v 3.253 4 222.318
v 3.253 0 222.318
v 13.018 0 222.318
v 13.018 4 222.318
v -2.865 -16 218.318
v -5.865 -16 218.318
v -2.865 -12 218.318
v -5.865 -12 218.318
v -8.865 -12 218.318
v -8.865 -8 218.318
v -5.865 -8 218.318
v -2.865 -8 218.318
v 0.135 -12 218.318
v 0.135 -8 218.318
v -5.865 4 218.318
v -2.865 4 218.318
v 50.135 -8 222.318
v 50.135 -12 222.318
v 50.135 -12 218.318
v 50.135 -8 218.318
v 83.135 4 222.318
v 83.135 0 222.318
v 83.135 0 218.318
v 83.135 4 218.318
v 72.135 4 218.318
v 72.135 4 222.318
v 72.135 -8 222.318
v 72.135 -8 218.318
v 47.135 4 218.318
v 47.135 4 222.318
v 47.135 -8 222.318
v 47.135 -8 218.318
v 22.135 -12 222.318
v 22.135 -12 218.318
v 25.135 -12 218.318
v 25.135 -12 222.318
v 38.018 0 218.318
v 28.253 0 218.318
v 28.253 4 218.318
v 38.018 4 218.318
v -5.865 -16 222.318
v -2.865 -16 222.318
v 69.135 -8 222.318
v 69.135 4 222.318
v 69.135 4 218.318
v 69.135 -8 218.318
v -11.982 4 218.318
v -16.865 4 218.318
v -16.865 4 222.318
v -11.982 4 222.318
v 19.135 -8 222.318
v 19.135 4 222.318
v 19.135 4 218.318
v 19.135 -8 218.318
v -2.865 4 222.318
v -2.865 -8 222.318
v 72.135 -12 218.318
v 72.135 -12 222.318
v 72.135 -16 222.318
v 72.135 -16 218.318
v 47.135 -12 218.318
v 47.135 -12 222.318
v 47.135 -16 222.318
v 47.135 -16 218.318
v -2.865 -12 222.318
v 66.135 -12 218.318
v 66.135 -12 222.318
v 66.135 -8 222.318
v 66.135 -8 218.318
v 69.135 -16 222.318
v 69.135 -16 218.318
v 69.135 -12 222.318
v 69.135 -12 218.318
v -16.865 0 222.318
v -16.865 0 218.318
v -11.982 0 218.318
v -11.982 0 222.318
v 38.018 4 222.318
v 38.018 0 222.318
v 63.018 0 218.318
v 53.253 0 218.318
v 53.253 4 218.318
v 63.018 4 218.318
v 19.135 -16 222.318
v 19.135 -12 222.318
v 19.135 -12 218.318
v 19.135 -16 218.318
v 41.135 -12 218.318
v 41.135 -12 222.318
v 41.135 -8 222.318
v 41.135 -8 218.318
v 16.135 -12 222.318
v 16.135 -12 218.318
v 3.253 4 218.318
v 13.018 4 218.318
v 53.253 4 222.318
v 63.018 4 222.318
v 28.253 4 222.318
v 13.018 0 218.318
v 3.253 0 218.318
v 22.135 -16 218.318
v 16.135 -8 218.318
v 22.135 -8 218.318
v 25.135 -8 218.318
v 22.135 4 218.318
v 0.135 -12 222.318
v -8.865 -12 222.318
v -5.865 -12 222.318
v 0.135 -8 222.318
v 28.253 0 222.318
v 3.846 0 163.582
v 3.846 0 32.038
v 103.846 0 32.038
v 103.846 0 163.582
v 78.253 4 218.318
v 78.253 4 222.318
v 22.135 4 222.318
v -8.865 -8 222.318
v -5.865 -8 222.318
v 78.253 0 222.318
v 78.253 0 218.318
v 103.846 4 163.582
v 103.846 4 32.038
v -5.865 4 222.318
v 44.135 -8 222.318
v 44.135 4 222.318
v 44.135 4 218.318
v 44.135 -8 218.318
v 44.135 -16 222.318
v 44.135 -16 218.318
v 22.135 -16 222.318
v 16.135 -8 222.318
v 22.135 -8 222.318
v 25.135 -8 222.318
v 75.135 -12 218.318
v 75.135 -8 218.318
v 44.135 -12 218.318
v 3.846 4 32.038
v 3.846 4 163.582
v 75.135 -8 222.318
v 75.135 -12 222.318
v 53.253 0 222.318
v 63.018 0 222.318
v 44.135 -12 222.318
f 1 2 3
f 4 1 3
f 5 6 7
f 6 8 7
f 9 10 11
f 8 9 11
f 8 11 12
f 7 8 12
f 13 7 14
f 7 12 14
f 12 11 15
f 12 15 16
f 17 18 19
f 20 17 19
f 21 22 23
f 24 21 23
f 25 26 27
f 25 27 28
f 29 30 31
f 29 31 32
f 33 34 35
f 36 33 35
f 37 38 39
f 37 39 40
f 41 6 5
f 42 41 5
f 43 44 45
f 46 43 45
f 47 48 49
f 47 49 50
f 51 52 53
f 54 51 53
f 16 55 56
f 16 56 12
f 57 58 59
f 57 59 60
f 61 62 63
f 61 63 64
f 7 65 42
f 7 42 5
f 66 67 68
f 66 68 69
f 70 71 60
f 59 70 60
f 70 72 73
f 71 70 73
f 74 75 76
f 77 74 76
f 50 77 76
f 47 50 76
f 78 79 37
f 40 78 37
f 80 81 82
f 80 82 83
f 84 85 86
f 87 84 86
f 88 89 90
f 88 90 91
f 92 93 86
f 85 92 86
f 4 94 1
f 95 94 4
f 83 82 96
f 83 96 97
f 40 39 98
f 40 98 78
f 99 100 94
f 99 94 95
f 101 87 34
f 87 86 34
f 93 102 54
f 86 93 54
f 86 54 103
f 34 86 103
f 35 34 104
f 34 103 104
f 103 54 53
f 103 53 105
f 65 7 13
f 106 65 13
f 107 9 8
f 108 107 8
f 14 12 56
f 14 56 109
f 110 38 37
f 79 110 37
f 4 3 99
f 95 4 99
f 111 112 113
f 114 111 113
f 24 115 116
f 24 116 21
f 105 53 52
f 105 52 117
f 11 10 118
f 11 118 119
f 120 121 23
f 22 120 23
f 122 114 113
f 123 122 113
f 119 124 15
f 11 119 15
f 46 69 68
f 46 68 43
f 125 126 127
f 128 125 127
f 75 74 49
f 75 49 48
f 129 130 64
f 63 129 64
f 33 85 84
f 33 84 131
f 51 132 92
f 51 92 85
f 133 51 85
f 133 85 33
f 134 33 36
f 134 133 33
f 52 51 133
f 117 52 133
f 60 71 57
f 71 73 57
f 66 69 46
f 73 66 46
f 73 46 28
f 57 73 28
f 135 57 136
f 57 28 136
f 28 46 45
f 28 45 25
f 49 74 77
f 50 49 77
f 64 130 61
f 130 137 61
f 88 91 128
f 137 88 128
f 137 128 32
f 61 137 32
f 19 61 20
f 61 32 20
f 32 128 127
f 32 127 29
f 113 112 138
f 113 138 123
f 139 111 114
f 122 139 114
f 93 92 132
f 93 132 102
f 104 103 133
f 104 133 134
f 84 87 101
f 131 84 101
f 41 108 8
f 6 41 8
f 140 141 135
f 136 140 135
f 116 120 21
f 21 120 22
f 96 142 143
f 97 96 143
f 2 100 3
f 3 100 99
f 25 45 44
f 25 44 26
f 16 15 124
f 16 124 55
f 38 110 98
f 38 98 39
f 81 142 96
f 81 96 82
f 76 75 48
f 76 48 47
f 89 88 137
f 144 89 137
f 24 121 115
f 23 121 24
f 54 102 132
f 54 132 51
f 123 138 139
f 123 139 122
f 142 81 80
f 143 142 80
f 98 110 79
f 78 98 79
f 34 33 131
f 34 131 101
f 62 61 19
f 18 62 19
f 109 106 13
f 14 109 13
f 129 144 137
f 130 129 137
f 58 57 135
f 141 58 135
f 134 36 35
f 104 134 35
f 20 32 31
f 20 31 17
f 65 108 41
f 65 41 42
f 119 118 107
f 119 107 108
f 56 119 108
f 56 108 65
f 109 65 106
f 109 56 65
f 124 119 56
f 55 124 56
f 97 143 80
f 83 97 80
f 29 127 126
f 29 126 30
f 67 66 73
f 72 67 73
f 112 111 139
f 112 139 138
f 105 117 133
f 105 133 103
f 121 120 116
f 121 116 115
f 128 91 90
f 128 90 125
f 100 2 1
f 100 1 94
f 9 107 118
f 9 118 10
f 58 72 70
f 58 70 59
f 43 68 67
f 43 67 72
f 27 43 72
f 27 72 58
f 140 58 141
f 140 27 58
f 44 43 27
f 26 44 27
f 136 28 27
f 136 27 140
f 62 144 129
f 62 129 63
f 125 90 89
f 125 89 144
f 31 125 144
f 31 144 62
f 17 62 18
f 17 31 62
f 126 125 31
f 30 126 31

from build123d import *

# Parameters (mm, degrees)
SKETCH3_W             = 4.882352942
SKETCH3_H             = 4
BOSS_EXTRUDE2_DEPTH   = 4
SKETCH3_W_2           = 3
BOSS_EXTRUDE2_2_DEPTH = 4
SKETCH3_W_3           = 9.764705883
BOSS_EXTRUDE2_3_DEPTH = 4
BOSS_EXTRUDE2_4_DEPTH = 4
BOSS_EXTRUDE2_5_DEPTH = 4
BOSS_EXTRUDE2_6_DEPTH = 4
BOSS_EXTRUDE2_7_DEPTH = 4
BOSS_EXTRUDE2_8_DEPTH = 4
SKETCH3_W_4           = 4.882352941
BOSS_EXTRUDE2_9_DEPTH = 4
SKETCH3_6_W           = 3
SKETCH3_6_H           = 4
BOSS_EXTRUDE4_DEPTH   = 16
BOSS_EXTRUDE5_START   = -12
SKETCH3_7_W           = 3
SKETCH3_7_H           = 4
BOSS_EXTRUDE5_DEPTH   = 4
SKETCH4_W             = 100
SKETCH4_H             = 131.543597655
BOSS_EXTRUDE6_DEPTH   = 4


with BuildPart() as part:
    # Sketch3 → Boss-Extrude2 (new body)
    with BuildSketch(Plane(origin=(0, 0, 0), x_dir=(1, 0, 0), z_dir=(0, 1, 0))):
        with Locations((-14.423551679, -220.31766228)):
            Rectangle(SKETCH3_W, SKETCH3_H)
    extrude(amount=BOSS_EXTRUDE2_DEPTH)


with BuildPart() as body_2:
    # Sketch3 → Boss-Extrude2 2 (new body)
    with BuildSketch(Plane(origin=(0, 0, 0), x_dir=(1, 0, 0), z_dir=(0, 1, 0))):
        with Locations((-4.36472815, -220.31766228)):
            Rectangle(SKETCH3_W_2, SKETCH3_H)
    extrude(amount=BOSS_EXTRUDE2_2_DEPTH)



with BuildPart() as body_3:
    # Sketch3 → Boss-Extrude2 3 (new body)
    with BuildSketch(Plane(origin=(0, 0, 0), x_dir=(1, 0, 0), z_dir=(0, 1, 0))):
        with Locations((8.135271851, -220.31766228)):
            Rectangle(SKETCH3_W_3, SKETCH3_H)
    extrude(amount=BOSS_EXTRUDE2_3_DEPTH)


with BuildPart() as body_4:
    # Sketch3 → Boss-Extrude2 4 (new body)
    with BuildSketch(Plane(origin=(0, 0, 0), x_dir=(1, 0, 0), z_dir=(0, 1, 0))):
        with Locations((20.63527185, -220.31766228)):
            Rectangle(SKETCH3_W_2, SKETCH3_H)
    extrude(amount=BOSS_EXTRUDE2_4_DEPTH)


with BuildPart() as body_5:
    # Sketch3 → Boss-Extrude2 5 (new body)
    with BuildSketch(Plane(origin=(0, 0, 0), x_dir=(1, 0, 0), z_dir=(0, 1, 0))):
        with Locations((33.135271851, -220.31766228)):
            Rectangle(SKETCH3_W_3, SKETCH3_H)
    extrude(amount=BOSS_EXTRUDE2_5_DEPTH)


with BuildPart() as body_6:
    # Sketch3 → Boss-Extrude2 6 (new body)
    with BuildSketch(Plane(origin=(0, 0, 0), x_dir=(1, 0, 0), z_dir=(0, 1, 0))):
        with Locations((45.63527185, -220.31766228)):
            Rectangle(SKETCH3_W_2, SKETCH3_H)
    extrude(amount=BOSS_EXTRUDE2_6_DEPTH)


with BuildPart() as body_7:
    # Sketch3 → Boss-Extrude2 7 (new body)
    with BuildSketch(Plane(origin=(0, 0, 0), x_dir=(1, 0, 0), z_dir=(0, 1, 0))):
        with Locations((58.135271851, -220.31766228)):
            Rectangle(SKETCH3_W_3, SKETCH3_H)
    extrude(amount=BOSS_EXTRUDE2_7_DEPTH)


with BuildPart() as body_8:
    # Sketch3 → Boss-Extrude2 8 (new body)
    with BuildSketch(Plane(origin=(0, 0, 0), x_dir=(1, 0, 0), z_dir=(0, 1, 0))):
        with Locations((70.63527185, -220.31766228)):
            Rectangle(SKETCH3_W_2, SKETCH3_H)
    extrude(amount=BOSS_EXTRUDE2_8_DEPTH)


with BuildPart() as body_9:
    # Sketch3 → Boss-Extrude2 9 (new body)
    with BuildSketch(Plane(origin=(0, 0, 0), x_dir=(1, 0, 0), z_dir=(0, 1, 0))):
        with Locations((80.694095379, -220.31766228)):
            Rectangle(SKETCH3_W_4, SKETCH3_H)
    extrude(amount=BOSS_EXTRUDE2_9_DEPTH)


with BuildPart() as body_2_1:
    add(body_2.part)

    add(body_4.part)  # Boss-Extrude4 merges body 4

    add(body_6.part)  # Boss-Extrude4 merges body 6

    add(body_8.part)  # Boss-Extrude4 merges body 8
    # Sketch3<6> → Boss-Extrude4 (add)
    with BuildSketch(Plane(origin=(0, 0, 0), x_dir=(1, 0, 0), z_dir=(0, 1, 0))):
        with Locations((-4.36472815, -220.31766228)):
            Rectangle(SKETCH3_6_W, SKETCH3_6_H)
        with Locations((20.63527185, -220.31766228)):
            Rectangle(SKETCH3_6_W, SKETCH3_6_H)
        with Locations((45.63527185, -220.31766228)):
            Rectangle(SKETCH3_6_W, SKETCH3_6_H)
        with Locations((70.63527185, -220.31766228)):
            Rectangle(SKETCH3_6_W, SKETCH3_6_H)
    extrude(amount=-BOSS_EXTRUDE4_DEPTH)

    # Sketch3<7> → Boss-Extrude5 (add)
    with BuildSketch(Plane(origin=(0, 0, 0), x_dir=(1, 0, 0), z_dir=(0, 1, 0)).offset(BOSS_EXTRUDE5_START)):
        with Locations((-7.36472815, -220.31766228)):
            Rectangle(SKETCH3_7_W, SKETCH3_7_H)
        with Locations((-1.36472815, -220.31766228)):
            Rectangle(SKETCH3_7_W, SKETCH3_7_H)
        with Locations((17.63527185, -220.31766228)):
            Rectangle(SKETCH3_7_W, SKETCH3_7_H)
        with Locations((23.63527185, -220.31766228)):
            Rectangle(SKETCH3_7_W, SKETCH3_7_H)
        with Locations((42.63527185, -220.31766228)):
            Rectangle(SKETCH3_7_W, SKETCH3_7_H)
        with Locations((48.63527185, -220.31766228)):
            Rectangle(SKETCH3_7_W, SKETCH3_7_H)
        with Locations((67.63527185, -220.31766228)):
            Rectangle(SKETCH3_7_W, SKETCH3_7_H)
        with Locations((73.63527185, -220.31766228)):
            Rectangle(SKETCH3_7_W, SKETCH3_7_H)
    extrude(amount=BOSS_EXTRUDE5_DEPTH)


with BuildPart() as body_7_2:
    # Sketch4 → Boss-Extrude6 (new body)
    with BuildSketch(Plane(origin=(0, 0, 0), x_dir=(1, 0, 0), z_dir=(0, 1, 0))):
        with Locations((53.84559612, -97.809820722)):
            Rectangle(SKETCH4_W, SKETCH4_H)
    extrude(amount=BOSS_EXTRUDE6_DEPTH)


solid = Compound([part.part, body_3.part, body_5.part, body_7.part, body_9.part, body_2_1.part, body_7_2.part])
